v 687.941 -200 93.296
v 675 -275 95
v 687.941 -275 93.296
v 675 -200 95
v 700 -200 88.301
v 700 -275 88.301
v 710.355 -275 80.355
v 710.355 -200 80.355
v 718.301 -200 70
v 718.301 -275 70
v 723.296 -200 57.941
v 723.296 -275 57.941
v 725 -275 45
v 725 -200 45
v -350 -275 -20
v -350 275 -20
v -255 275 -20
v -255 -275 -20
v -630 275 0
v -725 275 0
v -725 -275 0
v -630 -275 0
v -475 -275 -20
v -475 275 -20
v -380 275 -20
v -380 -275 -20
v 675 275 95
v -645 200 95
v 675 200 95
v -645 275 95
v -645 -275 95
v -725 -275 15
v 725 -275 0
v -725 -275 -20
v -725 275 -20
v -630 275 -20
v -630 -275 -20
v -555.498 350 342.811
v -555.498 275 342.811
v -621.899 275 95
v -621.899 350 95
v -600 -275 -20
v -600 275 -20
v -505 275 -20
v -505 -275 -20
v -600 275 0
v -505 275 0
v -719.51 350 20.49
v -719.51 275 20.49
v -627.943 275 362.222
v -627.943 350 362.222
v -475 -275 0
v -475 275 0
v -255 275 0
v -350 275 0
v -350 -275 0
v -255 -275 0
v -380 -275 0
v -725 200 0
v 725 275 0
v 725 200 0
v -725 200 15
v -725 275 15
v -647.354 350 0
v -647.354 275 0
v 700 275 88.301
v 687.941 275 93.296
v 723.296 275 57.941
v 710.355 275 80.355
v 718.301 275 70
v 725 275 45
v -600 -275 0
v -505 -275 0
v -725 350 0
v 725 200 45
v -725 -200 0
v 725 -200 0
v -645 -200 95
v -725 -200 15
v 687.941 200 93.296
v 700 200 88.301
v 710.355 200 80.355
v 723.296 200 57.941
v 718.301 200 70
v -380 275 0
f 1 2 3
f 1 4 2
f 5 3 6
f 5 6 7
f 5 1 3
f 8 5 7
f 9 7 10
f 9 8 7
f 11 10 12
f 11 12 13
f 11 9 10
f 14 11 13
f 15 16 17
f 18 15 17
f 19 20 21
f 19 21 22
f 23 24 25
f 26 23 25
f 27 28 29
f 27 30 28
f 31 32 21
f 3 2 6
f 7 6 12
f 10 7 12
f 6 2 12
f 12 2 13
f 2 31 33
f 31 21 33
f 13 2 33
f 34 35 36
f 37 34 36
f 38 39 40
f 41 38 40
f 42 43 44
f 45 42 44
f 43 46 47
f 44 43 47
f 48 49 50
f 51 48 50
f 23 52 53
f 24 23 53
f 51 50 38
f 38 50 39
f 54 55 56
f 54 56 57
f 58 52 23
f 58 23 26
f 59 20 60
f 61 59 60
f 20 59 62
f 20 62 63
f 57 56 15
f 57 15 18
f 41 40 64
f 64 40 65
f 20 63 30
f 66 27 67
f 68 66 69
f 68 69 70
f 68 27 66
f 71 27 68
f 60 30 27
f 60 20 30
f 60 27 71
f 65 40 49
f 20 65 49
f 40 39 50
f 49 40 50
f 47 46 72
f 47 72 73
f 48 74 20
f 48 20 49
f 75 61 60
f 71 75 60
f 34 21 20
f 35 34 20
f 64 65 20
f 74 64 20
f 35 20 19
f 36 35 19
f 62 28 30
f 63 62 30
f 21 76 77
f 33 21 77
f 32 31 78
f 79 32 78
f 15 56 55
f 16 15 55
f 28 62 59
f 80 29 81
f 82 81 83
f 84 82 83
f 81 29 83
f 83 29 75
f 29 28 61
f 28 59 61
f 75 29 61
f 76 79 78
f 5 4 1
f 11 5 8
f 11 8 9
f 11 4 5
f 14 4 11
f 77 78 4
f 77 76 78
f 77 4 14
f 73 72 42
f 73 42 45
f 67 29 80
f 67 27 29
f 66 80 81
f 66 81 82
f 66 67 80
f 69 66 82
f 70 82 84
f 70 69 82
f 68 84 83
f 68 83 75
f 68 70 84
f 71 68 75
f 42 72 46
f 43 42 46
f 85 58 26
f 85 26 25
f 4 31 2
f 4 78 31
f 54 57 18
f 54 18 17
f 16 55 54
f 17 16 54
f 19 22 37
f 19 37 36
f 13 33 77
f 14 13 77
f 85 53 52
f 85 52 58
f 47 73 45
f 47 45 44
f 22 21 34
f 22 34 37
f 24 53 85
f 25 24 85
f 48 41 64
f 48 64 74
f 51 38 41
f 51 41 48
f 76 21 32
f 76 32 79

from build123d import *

# Parameters (mm, degrees)
F0_W     = 1450
F0_H     = 75
F1_DEPTH = 95
F2_W     = 95
F2_H     = 550
F3_DEPTH = 20
F4_SIZE  = 80
F5_R     = 50
F7_DEPTH = 75


with BuildPart() as f1:
    # F0 (on Top) → F1 (new body)
    with BuildSketch(Plane.XY):
        with Locations((0, 237.5)):
            Rectangle(F0_W, F0_H)
        with Locations((0, -237.5)):
            Rectangle(F0_W, F0_H)
    extrude(amount=F1_DEPTH)

    # F4
    f4_edges = [f1.edges().sort_by_distance(p)[0] for p in [
        (-725, 237.5, 95),
        (-725, -237.5, 95),
    ]]
    chamfer(f4_edges, length=F4_SIZE)

    # F5
    f5_edges = [f1.edges().sort_by_distance(p)[0] for p in [
        (725, 237.5, 95),
        (725, -237.5, 95),
    ]]
    fillet(f5_edges, radius=F5_R)


with BuildPart() as f3:
    # F2 (on Top) → F3 (new body)
    with BuildSketch(Plane.XY):
        with Locations((-677.5, 0)):
            Rectangle(F2_W, F2_H)
        with Locations((-552.5, 0)):
            Rectangle(F2_W, F2_H)
        with Locations((-427.5, 0)):
            Rectangle(F2_W, F2_H)
        with Locations((-302.5, 0)):
            Rectangle(F2_W, F2_H)
    extrude(amount=-F3_DEPTH)


with BuildPart() as f7:
    # F6 (on face) → F7 (new body)
    with BuildSketch(Plane(origin=(0, 275, 0), x_dir=(-1, 0, 0), z_dir=(0, 1, 0))):
        Polygon((645, 95), (719.509619, 20.490381), (627.942858, 362.222185), (555.498421, 342.810756), (621.899113, 95), align=None)
        Polygon((647.354286, 0), (725, 0), (719.509619, 20.490381), (645, 95), (621.899113, 95), align=None)
    extrude(amount=F7_DEPTH)


solid = Compound([f1.part, f3.part, f7.part])
